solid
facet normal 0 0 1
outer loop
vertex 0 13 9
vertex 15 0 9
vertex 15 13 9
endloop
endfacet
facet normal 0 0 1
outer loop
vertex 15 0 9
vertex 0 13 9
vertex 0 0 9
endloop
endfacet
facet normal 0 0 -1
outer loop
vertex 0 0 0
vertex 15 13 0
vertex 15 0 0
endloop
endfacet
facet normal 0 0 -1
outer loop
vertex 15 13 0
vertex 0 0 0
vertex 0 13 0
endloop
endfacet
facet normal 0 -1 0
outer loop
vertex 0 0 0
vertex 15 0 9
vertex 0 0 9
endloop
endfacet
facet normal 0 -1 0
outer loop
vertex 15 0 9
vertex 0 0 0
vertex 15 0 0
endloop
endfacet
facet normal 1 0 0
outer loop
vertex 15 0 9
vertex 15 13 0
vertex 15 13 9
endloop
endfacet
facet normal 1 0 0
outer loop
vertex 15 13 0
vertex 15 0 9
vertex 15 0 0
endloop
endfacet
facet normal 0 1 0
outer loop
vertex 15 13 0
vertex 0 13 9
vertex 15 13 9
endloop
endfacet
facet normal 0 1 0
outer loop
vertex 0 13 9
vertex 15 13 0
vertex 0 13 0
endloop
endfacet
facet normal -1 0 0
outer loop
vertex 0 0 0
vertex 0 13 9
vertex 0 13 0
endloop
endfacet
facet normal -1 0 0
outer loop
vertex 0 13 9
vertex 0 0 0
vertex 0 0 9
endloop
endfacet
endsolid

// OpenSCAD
// Generated by SolidPython 1.0.1 on 2020-07-29 00:46:55


cube(size = [15, 13, 9]);
/***********************************************
*********      SolidPython code:      **********
************************************************
 
# import packages: SolidPython
from solid import *
from solid.utils import *
from itertools import chain, combinations, permutations


class Resize:

    def __init__(self, scad_file):
        self.scad_file = scad_file
        #self.scad_file = import_scad(scad_file)
        # cone/cylinder param:
        self.r1 = 0
        self.r2 = 0
        self.h = 0
        # rectangular prism param:
        self.w = 0
        self.l = 0
        # ellipse param:
        self.r = 0

    # import OpenScad code (file name corresponds to shape)


    # classify shape + parameters
    def assign(self, param1, param2, param3):
        if self.scad_file == 'cone.scad':
            self.r1 = param1
            self.r2 = param2
            self.h = param3
        elif self.scad_file == 'cylinder.scad':
            self.r1 = param1
            self.r2 = param2
            self.h = param3
        elif self.scad_file == 'rectangularPrism.scad':
            self.h = param1
            self.l = param2
            self.w = param3
        else:
            self.r = param1
            self.h = param2

    # resize parameters
    def iterate(self):
        x = range(3, 20, 2)
        i = 1
        if self.scad_file == 'cone.scad':
            tempList = list(permutations(x, 2))
            for temp in tempList:
                param1 = temp[0]
                param2 = temp[1]
                filepath = 'produced_scad_files/' + 'cone' + str(param1) + '_' + str(param2) + '_' + '.scad'
                scad_render_to_file(cylinder(h=param1, r1=param2, r2=0), filepath)

        elif self.scad_file == 'cylinder.scad':
            tempList = list(permutations(x, 3))
            for temp in tempList:
                param1 = temp[0]
                param2 = temp[1]
                filepath = 'produced_scad_files/' + 'cylinder' + str(param1) + '_' + str(param2) + '_' + '.scad'
                scad_render_to_file(cylinder(h=param1, r1=param2, r2=param2), filepath)

        elif self.scad_file == 'rectangularPrism.scad':
            tempList = list(permutations(x, 3))
            for temp in tempList:
                param1 = temp[0]
                param2 = temp[1]
                param3 = temp[2]
                filepath = 'produced_scad_files/' + 'rectangularPrism' + str(param1) + '_' + str(param2) + '_' + str(
                    param3) + '.scad'
                scad_render_to_file(cube(size=(param1, param2, param3)), filepath)

        elif self.scad_file == 'ellipse.scad':
            tempList = list(permutations(x, 4))
            for temp in tempList:
                param1 = temp[0]
                param2 = temp[1]
                param3 = temp[2]
                param4 = temp[3]
                filepath = 'produced_scad_files/' + 'ellipse' + str(param1) + '_' + str(param2) + '_' + str(param3) + '_' + str(param4) + '.scad'
                scad_render_to_file(scale([param1, param2, param3])(sphere(r=param4)), filepath)

    def render_to_scadfile(self):
        scad_render_to_file(scad, 'example.scad') 
 
************************************************/
